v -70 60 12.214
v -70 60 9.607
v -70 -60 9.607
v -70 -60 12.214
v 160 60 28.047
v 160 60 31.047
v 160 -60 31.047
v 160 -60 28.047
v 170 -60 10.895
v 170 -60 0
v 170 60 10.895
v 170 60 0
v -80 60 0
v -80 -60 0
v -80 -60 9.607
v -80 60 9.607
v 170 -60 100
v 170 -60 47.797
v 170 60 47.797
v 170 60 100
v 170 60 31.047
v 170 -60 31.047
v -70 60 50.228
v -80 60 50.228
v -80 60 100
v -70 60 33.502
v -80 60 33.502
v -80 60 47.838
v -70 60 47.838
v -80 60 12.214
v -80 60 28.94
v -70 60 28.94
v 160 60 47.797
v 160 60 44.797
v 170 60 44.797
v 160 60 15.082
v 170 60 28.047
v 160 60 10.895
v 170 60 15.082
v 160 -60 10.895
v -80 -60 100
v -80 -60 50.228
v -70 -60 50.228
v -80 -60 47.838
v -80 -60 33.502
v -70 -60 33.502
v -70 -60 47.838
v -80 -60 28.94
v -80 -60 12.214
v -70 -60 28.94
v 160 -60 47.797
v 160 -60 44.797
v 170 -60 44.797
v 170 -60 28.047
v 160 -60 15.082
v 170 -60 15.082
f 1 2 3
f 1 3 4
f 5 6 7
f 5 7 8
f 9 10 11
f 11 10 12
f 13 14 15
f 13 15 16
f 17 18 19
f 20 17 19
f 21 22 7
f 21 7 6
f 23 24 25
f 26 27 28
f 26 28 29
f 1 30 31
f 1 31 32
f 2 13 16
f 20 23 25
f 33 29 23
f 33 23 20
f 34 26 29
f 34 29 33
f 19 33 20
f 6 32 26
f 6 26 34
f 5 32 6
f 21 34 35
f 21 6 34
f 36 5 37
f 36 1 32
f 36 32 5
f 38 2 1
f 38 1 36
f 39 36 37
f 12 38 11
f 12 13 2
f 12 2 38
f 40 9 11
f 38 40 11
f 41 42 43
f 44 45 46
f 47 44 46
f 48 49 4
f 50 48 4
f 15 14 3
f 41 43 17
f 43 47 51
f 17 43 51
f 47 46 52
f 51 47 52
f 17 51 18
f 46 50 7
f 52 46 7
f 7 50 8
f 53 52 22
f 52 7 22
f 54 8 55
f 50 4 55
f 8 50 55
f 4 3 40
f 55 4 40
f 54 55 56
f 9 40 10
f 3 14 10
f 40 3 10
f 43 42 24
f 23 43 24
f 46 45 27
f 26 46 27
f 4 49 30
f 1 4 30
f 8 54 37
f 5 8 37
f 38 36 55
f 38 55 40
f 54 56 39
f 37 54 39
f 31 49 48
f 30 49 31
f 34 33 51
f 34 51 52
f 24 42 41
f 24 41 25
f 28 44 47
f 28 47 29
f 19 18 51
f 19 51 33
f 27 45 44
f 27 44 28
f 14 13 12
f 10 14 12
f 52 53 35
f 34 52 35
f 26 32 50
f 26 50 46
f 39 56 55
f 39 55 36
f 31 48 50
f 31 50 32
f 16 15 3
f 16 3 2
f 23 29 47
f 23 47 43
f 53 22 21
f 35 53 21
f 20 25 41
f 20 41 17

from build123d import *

# Parameters (mm, degrees)
SKETCH_1_W          = 250
SKETCH_1_H          = 120
EXTRUDE_1_DEPTH     = 100
SKETCH_2_W          = 3
SKETCH_2_H          = 141.063947636
SKETCH_2_W_2        = 4.187427017
CUT_EXTRUDE_1_DEPTH = 10
SKETCH_3_W          = 2.606673318
SKETCH_3_H          = 138.805354188
SKETCH_3_W_2        = 4.561678307
SKETCH_3_W_3        = 2.389450542
CUT_EXTRUDE_2_DEPTH = 10


with BuildPart() as part:
    # 스케치1 → 보스-돌출1 (new body)
    with BuildSketch(Plane.XY):
        with Locations((45, 0)):
            Rectangle(SKETCH_1_W, SKETCH_1_H)
    extrude(amount=EXTRUDE_1_DEPTH)

    # 스케치2 → 컷-돌출1 (cut)
    with BuildSketch(Plane(origin=(170, 0, 0), x_dir=(0, 0, -1), z_dir=(1, 0, 0))):
        with Locations((-46.296564822, 2.74799898)):
            Rectangle(SKETCH_2_W, SKETCH_2_H)
        with Locations((-29.546856754, 2.74799898)):
            Rectangle(SKETCH_2_W, SKETCH_2_H)
        with Locations((-12.988577744, 2.74799898)):
            Rectangle(SKETCH_2_W_2, SKETCH_2_H)
    extrude(amount=-CUT_EXTRUDE_1_DEPTH, mode=Mode.SUBTRACT)

    # 스케치3 → 컷-돌출2 (cut)
    with BuildSketch(Plane.ZY.offset(80)):
        with Locations((10.910436229, 0.546851797)):
            Rectangle(SKETCH_3_W, SKETCH_3_H)
        with Locations((31.220765833, 0.546851797)):
            Rectangle(SKETCH_3_W_2, SKETCH_3_H)
        with Locations((49.033033506, 0.546851797)):
            Rectangle(SKETCH_3_W_3, SKETCH_3_H)
    extrude(amount=-CUT_EXTRUDE_2_DEPTH, mode=Mode.SUBTRACT)


solid = part.part
